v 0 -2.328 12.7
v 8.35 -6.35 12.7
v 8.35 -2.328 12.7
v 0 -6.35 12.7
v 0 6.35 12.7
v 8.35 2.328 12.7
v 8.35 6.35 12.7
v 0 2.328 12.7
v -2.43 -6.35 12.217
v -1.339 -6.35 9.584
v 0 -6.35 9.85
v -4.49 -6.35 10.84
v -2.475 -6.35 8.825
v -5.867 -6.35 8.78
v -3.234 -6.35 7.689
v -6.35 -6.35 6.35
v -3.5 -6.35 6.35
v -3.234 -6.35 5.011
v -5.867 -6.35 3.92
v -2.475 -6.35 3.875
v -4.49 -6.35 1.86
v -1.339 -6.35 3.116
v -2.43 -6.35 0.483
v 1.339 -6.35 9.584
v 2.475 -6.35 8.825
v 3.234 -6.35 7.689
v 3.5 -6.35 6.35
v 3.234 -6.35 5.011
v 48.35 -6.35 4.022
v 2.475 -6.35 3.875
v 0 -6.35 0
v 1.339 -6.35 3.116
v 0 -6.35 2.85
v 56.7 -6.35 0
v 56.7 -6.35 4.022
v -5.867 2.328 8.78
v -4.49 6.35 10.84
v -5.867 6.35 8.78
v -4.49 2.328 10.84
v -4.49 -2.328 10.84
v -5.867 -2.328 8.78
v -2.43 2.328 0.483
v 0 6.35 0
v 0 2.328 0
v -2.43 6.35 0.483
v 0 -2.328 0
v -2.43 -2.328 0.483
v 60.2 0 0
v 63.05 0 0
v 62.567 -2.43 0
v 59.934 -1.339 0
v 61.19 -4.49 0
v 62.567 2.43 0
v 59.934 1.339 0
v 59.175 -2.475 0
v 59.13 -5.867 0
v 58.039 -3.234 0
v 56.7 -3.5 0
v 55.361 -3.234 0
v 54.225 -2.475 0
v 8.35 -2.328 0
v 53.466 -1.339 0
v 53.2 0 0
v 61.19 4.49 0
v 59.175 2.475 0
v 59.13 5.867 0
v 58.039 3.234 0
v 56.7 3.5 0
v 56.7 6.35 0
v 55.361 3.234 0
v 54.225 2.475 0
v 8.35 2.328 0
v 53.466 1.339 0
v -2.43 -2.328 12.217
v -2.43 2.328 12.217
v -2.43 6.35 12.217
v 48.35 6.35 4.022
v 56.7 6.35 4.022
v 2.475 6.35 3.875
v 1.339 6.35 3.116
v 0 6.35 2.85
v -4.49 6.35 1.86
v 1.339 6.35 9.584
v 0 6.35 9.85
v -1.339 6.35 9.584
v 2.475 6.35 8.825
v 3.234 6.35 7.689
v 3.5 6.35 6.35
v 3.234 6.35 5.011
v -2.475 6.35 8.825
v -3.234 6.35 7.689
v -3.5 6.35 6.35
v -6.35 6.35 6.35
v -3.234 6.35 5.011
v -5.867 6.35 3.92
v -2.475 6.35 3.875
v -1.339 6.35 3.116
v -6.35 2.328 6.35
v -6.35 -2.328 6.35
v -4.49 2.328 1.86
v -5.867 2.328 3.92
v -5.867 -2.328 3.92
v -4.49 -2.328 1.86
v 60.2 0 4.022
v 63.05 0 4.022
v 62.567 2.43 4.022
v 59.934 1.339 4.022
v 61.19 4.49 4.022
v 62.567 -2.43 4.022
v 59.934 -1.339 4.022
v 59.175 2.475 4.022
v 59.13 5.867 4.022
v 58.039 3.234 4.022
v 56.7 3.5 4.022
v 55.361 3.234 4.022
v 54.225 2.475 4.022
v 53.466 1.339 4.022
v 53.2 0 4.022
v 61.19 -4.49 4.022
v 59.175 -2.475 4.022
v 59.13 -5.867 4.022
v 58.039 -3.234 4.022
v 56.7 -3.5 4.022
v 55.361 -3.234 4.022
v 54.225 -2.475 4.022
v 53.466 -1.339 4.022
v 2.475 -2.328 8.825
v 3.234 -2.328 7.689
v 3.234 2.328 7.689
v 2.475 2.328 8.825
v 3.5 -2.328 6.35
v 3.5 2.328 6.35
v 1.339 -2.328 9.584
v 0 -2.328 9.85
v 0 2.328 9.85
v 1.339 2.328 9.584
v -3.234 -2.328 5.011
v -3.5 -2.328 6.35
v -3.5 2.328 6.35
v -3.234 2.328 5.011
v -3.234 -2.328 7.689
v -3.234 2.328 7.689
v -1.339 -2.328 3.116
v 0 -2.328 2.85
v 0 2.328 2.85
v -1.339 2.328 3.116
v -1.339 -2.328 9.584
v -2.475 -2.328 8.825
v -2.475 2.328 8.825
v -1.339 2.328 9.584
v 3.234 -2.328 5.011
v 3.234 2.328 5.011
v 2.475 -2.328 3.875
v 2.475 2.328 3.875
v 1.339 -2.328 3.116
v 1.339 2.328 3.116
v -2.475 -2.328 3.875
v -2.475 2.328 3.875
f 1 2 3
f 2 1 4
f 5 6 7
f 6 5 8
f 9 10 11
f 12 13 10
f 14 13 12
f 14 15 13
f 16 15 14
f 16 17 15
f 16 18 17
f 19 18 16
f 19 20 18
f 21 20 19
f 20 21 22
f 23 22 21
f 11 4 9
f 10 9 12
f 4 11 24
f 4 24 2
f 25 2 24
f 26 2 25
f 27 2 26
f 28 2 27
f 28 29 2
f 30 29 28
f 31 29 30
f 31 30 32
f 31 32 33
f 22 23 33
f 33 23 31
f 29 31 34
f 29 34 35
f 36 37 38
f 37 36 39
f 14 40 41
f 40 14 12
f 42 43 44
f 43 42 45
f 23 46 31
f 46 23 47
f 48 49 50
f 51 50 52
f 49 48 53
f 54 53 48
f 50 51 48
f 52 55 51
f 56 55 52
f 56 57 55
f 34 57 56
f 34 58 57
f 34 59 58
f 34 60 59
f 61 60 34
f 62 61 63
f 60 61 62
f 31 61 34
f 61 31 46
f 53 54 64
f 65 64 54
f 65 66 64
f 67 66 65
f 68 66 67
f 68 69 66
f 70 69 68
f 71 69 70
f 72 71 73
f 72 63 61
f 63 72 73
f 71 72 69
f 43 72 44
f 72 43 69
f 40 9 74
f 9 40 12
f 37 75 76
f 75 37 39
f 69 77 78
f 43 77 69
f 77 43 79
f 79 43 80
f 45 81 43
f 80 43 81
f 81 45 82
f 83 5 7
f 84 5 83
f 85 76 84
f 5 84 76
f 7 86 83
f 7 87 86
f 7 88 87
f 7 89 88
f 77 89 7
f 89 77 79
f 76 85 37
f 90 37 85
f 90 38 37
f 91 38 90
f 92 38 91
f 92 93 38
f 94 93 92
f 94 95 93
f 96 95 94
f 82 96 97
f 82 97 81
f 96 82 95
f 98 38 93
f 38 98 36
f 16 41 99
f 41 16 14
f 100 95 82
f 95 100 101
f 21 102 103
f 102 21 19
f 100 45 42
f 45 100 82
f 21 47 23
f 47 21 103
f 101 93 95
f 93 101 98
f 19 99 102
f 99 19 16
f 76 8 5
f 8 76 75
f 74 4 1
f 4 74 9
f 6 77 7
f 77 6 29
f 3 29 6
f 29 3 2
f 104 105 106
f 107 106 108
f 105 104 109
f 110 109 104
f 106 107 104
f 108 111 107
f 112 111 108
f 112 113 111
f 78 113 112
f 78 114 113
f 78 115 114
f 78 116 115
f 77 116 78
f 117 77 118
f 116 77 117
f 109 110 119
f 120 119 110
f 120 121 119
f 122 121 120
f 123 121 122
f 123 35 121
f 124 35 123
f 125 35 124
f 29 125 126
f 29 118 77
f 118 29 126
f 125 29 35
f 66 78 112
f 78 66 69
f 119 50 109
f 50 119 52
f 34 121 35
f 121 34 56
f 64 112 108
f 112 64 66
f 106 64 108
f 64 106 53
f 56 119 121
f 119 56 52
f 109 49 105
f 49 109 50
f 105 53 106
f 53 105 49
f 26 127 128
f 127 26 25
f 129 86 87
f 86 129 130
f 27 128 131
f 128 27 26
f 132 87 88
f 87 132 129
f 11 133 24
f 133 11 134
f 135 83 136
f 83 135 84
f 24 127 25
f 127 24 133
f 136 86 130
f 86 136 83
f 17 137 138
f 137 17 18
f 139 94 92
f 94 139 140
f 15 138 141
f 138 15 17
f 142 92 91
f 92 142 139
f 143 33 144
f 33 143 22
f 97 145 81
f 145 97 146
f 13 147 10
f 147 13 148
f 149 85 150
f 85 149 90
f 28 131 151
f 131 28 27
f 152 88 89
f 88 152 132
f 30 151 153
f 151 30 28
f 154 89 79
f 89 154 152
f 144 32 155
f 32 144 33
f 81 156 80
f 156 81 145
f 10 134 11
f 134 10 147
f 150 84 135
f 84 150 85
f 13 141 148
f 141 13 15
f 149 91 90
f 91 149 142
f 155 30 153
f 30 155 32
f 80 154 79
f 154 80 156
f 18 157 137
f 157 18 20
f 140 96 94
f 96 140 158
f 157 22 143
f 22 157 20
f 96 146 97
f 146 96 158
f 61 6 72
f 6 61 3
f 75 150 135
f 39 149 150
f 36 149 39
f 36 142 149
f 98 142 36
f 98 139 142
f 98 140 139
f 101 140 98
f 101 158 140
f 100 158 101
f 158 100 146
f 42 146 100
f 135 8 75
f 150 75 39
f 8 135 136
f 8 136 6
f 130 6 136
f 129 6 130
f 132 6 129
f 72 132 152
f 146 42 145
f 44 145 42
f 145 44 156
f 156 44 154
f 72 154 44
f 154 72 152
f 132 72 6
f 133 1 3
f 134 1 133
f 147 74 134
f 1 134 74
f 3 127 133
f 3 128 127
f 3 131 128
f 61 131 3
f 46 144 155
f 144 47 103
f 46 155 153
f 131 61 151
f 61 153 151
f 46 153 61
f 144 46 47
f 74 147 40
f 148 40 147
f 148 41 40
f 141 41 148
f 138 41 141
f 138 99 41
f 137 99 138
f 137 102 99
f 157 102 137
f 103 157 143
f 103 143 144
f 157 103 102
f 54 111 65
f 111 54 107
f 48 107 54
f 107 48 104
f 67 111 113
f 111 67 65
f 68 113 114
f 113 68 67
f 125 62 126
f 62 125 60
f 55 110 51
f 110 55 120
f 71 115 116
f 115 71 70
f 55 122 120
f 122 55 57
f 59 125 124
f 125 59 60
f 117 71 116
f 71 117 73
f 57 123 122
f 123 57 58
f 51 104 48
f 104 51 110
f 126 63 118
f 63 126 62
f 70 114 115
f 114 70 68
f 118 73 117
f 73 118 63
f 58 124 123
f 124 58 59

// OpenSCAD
//use <tyler.scad>;

/**
 * Linkos: by Tyler Bletsch (Tyler.Bletsch@gmail.com)
 */
 
// preview[view:south west, tilt:top diagonal]

$fn=16*1;

E=0.05*1;
inch = 25.4*1;

/* [Global] */

// Type of link to show: LINK mates to another link, PLATE_HORIZONTAL and PLATE_VERTICAL are used to mount to whatever object you're messing with. 
part = "LINK"; // [LINK, PLATE_HORIZONTAL, PLATE_VERTICAL]

/* [General] */

// Length of the link, excluding the mounting stuff at the ends (mm)
link_len = 40;

// Diameter of the hole used in linkages (mm). I like to use 1/4-20 bolts, so I set this to 0.25" with a 10% margin, or about 7mm.
link_hole_dia = 7; 
/// (0.25*inch*1.10)

// Thickness of the link (mm). For a nice look, make this bolt_length-nut_thickness. For example, you can use 3/4" bolts with 1/4"-thick nuts by setting this to 1/2" (12.7mm). This variable is forced to be at least 50% greater than link_hole_dia for strength.
thickness_ = 12.7;
thickness = max(link_hole_dia*1.5,thickness_);

// Extra margin on the side of the link to allow for clean swiveling (mm).
tab_extra = 2;

// How much to loosen the fit of the links (%).
layer_tolerance_percent = 5; // [0:25]

layer = thickness/3 * (1 - layer_tolerance_percent/100);

/* [Horizontal plate] */

// Diameter for mounting holes on the horizontal plate (mm). 4.4mm works for #8 screws.
hplate_hole_dia = 4.4;

// Number of holes in the X direction
hplate_num_holes_x = 2; // [1:4]

// Number of holes in the Y direction
hplate_num_holes_y = 2; // [1:4]

// Thickness of the horizontal plate (mm)
hplate_thickness = 2;

// Rounding radius of the plate corners (mm)
hplate_corner_radius = 2;

// Optional: you can boost the plate width irrespective of the holes here (mm)
hplate_extra_width = 0; 

// Optional: you can boost the plate height irrespective of the holes here (mm)
hplate_extra_height = 0;

hplate_width = 3*hplate_hole_dia*hplate_num_holes_x + hplate_extra_width;
hplate_height= 3*hplate_hole_dia*hplate_num_holes_y + hplate_extra_height;


/* [Vertical plate] */

// Diameter for mounting holes on the vertical plate (mm). 4.4mm works for #8 screws.
vplate_hole_dia = 4.4;

// Number of holes in the Y direction
vplate_num_holes_y = 1; // [1:4]

// Number of holes in the Z direction
vplate_num_holes_z = 3; // [1:4]

// Thickness of the plate (mm)
vplate_thickness = 3;

// Optional: you can boost the plate width irrespective of the holes here (mm)
vplate_extra_width = 0;

// Optional: you can boost the plate height irrespective of the holes here (mm)
vplate_extra_height = 0;

vplate_width =(3*vplate_num_holes_y)*vplate_hole_dia+vplate_extra_width;
vplate_height=(3*vplate_num_holes_z)*vplate_hole_dia+vplate_extra_height;

// hull each child in a row, one after another -- makes a "snake" of the given forms
module hull_chain() {
    for (i = [1:$children-1]) {
        hull() children([i-1:i]);
    }
}

left_center_x  = 0*0;
left_tab_start_x = left_center_x+thickness/2+tab_extra;
right_center_x = thickness/2+tab_extra+link_len+tab_extra+thickness/2;
right_tab_start_x = right_center_x-thickness/2-tab_extra;

difference() {
    if (part=="LINK") {
        hull_chain() {
            translate([left_center_x,0,thickness/2]) rotate([90]) cylinder(d=thickness, h=thickness, center=true);
            translate([left_tab_start_x,0]) cube2([E,thickness,thickness],aligns="RCL");
            translate([right_tab_start_x,0]) cube2([E,thickness,layer],aligns="RCL");
            translate([right_center_x,0]) cylinder(d=thickness, h=layer, center=false);
        }
    } else if (part=="PLATE_HORIZONTAL") {
        hull_chain() {
            translate([left_center_x,0,thickness/2]) rotate([90]) cylinder(d=thickness, h=thickness, center=true);
            translate([left_tab_start_x,0]) cube2([E,thickness,thickness],aligns="RCL");
            translate([right_tab_start_x,0]) cube2([E,hplate_height,hplate_thickness],aligns="RCL");
            translate([right_tab_start_x,0]) cube2([hplate_width,hplate_height,hplate_thickness],xy_radius=hplate_corner_radius, aligns="LCL");
        }
    } else if (part=="PLATE_VERTICAL") {
        hull_chain() {
            translate([left_center_x,0,thickness/2]) rotate([90]) cylinder(d=thickness, h=thickness, center=true);
            translate([left_tab_start_x,0]) cube2([E,thickness,thickness],aligns="RCL");
            translate([right_tab_start_x,0]) cube2([E,vplate_width,thickness],aligns="RCL");
        }
        translate([right_tab_start_x,0]) cube2([vplate_thickness,vplate_width,thickness+vplate_height],aligns="LCL");
    }

    // left hole
    translate([0,0,thickness/2]) rotate([90]) cylinder(d=link_hole_dia,h=thickness+E,center=true); 
    
    // left cutout (to make two tabs)
    translate([0,0,-E]) cube2([2*(thickness/2+tab_extra),thickness-2*layer,thickness+2*E],aligns="CCL");

    // right hole
    if (part=="LINK") {
        translate([right_center_x,0]) cylinder(d=link_hole_dia, h=thickness+E, center=true);
    } else if (part=="PLATE_HORIZONTAL") {
        if (hplate_hole_dia && hplate_num_holes_x && hplate_num_holes_y) {
            translate([right_tab_start_x,0,-E]) {
                for (i = [0:hplate_num_holes_x-1]) for (j = [0:hplate_num_holes_y-1]) {
                    x = hplate_hole_dia*(1.5+3*i);
                    y = hplate_hole_dia*(1.5+3*(j-hplate_num_holes_y/2));
                    translate([x,y,0]) cylinder(d=hplate_hole_dia,h=hplate_thickness+2*E);
                }
            }
        }
    } else if (part=="PLATE_VERTICAL") {
        if (vplate_hole_dia && vplate_num_holes_y && vplate_num_holes_z) {
            translate([right_tab_start_x-E,0]) {
                for (i = [0:vplate_num_holes_y-1]) for (j = [0:vplate_num_holes_z-1]) {
                    echo(i,j);
                    y = vplate_hole_dia*(1.5+3*(i-vplate_num_holes_y/2));
                    z = vplate_hole_dia*(1.5+3*j) + thickness;
                    translate([0,y,z]) rotate([0,90]) cylinder(d=vplate_hole_dia,h=vplate_width+2*E);
                }
            }
        }
    }
    
}


module cube2(size,aligns="LLL",radius=0,xy_radius=0) {
    real_size = len(size) ? size : [size,size,size];
    tr = [
        aligns[0]=="C" ? 0 : aligns[0]=="R" ? (-real_size[0]/2) : (+real_size[0]/2),
        aligns[1]=="C" ? 0 : aligns[1]=="R" ? (-real_size[1]/2) : (+real_size[1]/2),
        aligns[2]=="C" ? 0 : aligns[2]=="R" ? (-real_size[2]/2) : (+real_size[2]/2)
    ];
    translate(tr) {
        if (xy_radius>0) {
            inner_size = [for (v=real_size) v-min(xy_radius*2,v)];
            linear_extrude(real_size[2], center=true) offset(r=xy_radius) square([inner_size[0],inner_size[1]], center=true);
        } else if (radius>0) {
            if (radius*2 >= max(real_size)) {
                resize(real_size) sphere(1);
            } else {
                inner_size = [for (v=real_size) v-min(radius*2,v)];
                minkowski() {
                    cube(inner_size,center=true);
                    sphere(r=radius);
                }
            }
        } else {
            cube(real_size,center=true);
        }
    } 
}

